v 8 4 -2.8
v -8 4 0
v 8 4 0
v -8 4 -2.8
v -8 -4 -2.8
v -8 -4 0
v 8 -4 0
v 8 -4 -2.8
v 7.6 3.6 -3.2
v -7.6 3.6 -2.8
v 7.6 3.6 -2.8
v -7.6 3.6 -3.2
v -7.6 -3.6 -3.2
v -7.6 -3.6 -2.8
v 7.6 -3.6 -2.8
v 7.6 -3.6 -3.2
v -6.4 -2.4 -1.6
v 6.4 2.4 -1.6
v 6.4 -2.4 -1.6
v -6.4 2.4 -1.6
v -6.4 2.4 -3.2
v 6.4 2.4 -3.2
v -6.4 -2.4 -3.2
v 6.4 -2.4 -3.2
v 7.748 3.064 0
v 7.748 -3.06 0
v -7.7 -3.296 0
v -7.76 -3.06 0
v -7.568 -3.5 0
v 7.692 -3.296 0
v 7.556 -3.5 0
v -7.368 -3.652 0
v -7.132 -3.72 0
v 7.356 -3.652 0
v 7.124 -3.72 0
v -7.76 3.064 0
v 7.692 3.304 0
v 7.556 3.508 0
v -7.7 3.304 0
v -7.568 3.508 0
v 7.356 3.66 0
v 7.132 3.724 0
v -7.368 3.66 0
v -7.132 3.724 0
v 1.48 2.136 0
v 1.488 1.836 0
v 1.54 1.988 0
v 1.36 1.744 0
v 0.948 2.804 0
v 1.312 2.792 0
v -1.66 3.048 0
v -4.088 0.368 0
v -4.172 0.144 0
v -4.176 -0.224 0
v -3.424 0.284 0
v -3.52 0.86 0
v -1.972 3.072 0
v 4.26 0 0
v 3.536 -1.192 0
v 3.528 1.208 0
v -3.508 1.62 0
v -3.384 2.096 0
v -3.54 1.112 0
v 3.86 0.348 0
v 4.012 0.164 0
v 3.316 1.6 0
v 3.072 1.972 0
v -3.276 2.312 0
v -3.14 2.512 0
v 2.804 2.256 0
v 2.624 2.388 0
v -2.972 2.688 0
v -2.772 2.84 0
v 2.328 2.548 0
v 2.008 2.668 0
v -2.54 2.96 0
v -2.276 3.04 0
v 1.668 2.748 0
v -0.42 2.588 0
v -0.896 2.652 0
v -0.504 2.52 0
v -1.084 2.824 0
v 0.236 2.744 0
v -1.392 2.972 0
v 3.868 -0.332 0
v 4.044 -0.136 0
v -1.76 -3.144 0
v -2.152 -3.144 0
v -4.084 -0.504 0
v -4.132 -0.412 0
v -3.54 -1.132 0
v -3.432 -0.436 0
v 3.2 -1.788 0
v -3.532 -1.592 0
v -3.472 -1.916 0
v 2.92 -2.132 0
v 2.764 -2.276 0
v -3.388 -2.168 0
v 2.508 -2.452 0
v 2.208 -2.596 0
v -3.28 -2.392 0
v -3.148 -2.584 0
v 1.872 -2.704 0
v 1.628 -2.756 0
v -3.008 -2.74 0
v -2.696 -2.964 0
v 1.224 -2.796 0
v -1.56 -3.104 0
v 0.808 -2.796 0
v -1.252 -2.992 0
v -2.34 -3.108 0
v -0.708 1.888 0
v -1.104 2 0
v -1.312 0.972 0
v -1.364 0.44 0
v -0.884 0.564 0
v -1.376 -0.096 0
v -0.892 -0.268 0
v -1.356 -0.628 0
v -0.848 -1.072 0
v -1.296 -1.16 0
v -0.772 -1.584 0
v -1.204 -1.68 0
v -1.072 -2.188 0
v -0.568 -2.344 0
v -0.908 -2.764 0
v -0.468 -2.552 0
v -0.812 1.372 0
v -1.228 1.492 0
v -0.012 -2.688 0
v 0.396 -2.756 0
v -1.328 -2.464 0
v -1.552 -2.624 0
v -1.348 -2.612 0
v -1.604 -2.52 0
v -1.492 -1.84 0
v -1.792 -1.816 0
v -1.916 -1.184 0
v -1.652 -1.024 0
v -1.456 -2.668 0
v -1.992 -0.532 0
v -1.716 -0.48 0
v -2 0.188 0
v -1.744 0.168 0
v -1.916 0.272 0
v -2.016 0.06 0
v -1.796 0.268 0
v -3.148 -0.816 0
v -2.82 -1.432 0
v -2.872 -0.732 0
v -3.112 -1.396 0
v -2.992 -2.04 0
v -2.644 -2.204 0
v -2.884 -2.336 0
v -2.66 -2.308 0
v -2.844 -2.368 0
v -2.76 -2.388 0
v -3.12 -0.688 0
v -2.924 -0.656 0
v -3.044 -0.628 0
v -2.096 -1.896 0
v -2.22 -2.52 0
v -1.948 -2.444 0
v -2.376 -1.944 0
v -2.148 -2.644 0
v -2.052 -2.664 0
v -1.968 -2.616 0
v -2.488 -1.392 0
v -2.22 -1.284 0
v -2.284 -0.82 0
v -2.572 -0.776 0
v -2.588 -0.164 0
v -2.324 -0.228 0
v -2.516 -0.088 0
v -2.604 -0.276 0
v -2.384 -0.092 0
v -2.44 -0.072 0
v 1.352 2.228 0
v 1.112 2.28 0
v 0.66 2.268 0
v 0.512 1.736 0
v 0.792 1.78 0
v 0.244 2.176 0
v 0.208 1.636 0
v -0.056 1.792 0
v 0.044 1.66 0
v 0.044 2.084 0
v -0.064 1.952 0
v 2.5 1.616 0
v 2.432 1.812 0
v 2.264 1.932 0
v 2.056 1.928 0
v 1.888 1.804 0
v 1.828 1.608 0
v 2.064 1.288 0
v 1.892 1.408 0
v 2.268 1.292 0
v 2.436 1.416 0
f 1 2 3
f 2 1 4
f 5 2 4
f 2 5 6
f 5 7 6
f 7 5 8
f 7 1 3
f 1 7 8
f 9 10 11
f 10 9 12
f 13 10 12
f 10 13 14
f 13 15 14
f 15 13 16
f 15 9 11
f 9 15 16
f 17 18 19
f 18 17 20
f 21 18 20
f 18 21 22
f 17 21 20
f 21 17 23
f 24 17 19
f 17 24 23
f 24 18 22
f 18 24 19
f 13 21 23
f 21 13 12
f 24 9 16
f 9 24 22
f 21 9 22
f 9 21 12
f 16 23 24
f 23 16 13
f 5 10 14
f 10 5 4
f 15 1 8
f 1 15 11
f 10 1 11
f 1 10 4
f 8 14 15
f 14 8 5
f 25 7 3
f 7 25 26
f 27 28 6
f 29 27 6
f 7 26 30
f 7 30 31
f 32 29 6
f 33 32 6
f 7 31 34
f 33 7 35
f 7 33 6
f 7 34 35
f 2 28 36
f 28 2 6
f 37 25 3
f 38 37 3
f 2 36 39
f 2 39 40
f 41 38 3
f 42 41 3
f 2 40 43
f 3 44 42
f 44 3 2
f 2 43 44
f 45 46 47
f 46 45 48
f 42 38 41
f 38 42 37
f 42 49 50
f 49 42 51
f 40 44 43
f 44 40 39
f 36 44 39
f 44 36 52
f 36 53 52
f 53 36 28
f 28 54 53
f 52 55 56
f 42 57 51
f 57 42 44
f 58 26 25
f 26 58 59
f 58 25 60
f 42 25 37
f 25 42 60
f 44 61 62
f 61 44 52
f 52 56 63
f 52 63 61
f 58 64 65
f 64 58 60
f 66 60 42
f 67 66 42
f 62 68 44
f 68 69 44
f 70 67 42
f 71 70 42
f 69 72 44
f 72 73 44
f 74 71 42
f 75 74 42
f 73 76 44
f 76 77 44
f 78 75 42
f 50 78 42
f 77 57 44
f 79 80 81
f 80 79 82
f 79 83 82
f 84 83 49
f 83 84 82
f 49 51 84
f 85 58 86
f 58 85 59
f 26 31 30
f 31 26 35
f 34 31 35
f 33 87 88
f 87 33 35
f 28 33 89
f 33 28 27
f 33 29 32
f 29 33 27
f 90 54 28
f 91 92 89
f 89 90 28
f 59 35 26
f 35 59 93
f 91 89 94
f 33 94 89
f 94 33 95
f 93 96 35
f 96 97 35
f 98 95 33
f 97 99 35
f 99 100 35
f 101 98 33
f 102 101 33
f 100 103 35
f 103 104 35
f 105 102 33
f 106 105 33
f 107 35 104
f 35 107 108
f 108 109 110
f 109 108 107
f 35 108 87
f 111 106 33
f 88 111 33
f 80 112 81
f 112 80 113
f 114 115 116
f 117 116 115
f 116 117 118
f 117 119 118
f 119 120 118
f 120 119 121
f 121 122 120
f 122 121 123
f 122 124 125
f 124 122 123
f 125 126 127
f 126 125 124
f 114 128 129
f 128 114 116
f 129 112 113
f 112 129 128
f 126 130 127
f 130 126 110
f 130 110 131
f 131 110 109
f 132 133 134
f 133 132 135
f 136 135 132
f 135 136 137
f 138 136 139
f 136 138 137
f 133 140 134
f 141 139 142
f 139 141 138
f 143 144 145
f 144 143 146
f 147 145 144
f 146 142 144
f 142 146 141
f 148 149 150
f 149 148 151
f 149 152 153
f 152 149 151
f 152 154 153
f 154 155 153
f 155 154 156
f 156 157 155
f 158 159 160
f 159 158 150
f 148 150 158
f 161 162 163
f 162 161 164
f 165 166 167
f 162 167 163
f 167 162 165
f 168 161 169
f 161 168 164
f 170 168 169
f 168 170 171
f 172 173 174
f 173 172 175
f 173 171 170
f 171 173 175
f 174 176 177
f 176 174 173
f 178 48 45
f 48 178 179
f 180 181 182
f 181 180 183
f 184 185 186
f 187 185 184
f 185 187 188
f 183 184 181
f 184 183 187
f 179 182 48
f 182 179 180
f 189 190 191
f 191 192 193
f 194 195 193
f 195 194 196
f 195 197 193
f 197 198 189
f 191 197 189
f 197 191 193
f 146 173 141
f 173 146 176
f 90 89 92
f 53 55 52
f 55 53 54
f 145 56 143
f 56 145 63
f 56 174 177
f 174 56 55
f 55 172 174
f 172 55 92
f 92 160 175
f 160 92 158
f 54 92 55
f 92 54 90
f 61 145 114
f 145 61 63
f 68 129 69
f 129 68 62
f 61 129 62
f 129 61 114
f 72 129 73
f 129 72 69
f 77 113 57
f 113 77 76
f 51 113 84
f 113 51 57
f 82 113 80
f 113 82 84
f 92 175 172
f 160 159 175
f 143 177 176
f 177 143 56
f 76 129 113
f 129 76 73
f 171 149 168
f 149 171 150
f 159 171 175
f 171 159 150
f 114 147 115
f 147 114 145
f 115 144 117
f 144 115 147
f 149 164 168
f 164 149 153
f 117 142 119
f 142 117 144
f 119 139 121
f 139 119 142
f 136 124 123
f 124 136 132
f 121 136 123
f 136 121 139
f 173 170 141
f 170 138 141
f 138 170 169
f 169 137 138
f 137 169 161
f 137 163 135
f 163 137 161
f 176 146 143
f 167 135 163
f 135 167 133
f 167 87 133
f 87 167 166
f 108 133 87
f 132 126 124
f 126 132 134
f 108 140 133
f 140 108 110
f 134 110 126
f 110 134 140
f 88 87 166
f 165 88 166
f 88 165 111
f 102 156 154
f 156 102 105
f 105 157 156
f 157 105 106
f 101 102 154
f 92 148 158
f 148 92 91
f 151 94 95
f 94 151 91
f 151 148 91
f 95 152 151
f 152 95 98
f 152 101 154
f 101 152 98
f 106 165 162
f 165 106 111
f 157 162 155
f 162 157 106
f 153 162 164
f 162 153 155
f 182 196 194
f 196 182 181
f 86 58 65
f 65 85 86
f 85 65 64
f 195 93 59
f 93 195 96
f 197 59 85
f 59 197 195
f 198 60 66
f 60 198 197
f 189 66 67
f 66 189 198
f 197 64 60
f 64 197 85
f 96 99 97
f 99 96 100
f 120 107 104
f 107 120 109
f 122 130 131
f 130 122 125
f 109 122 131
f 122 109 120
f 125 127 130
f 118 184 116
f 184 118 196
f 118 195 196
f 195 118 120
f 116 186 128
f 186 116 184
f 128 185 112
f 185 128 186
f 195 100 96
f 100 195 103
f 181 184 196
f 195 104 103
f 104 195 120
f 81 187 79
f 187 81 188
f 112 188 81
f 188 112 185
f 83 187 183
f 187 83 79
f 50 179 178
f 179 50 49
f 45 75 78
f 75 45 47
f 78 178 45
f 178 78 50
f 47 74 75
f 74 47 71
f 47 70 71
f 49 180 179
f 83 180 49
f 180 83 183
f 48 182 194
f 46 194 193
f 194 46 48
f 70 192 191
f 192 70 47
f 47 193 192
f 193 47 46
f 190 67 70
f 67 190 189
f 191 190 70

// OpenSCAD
// file: ../p/box5.scad
use <../lib.scad>
function ldraw_lib__box5() = [
// 0 Box with 5 Faces and All Edges
// 0 Name: box5.dat
// 0 Author: James Jessiman
// 0 !LDRAW_ORG Primitive UPDATE 2012-01
// 0 !LICENSE Licensed under CC BY 4.0 : see CAreadme.txt
// 
// 0 BFC CERTIFY CCW
  [0,"BFC","CERTIFY"],
  [0,"BFC","CCW"],
// 
// 0 !HISTORY 2002-04-03 [sbliss] Modified for BFC compliance
// 0 !HISTORY 2002-04-25 [PTadmin] Official Update 2002-02
// 0 !HISTORY 2007-06-24 [PTadmin] Header formatted for Contributor Agreement
// 0 !HISTORY 2008-07-01 [PTadmin] Official Update 2008-01
// 0 !HISTORY 2012-02-16 [Philo] Changed to CCW
// 0 !HISTORY 2012-03-30 [PTadmin] Official Update 2012-01
// 
// 
// 2 24 1 1 1 -1 1 1
  [2,24,1,1,1,-1,1,1],
// 2 24 -1 1 1 -1 1 -1
  [2,24,-1,1,1,-1,1,-1],
// 2 24 -1 1 -1 1 1 -1
  [2,24,-1,1,-1,1,1,-1],
// 2 24 1 1 -1 1 1 1
  [2,24,1,1,-1,1,1,1],
// 2 24 1 0 1 -1 0 1
  [2,24,1,0,1,-1,0,1],
// 2 24 -1 0 1 -1 0 -1
  [2,24,-1,0,1,-1,0,-1],
// 2 24 -1 0 -1 1 0 -1
  [2,24,-1,0,-1,1,0,-1],
// 2 24 1 0 -1 1 0 1
  [2,24,1,0,-1,1,0,1],
// 2 24 1 0 1 1 1 1
  [2,24,1,0,1,1,1,1],
// 2 24 -1 0 1 -1 1 1
  [2,24,-1,0,1,-1,1,1],
// 2 24 1 0 -1 1 1 -1
  [2,24,1,0,-1,1,1,-1],
// 2 24 -1 0 -1 -1 1 -1
  [2,24,-1,0,-1,-1,1,-1],
// 4 16 -1 1 1 1 1 1 1 1 -1 -1 1 -1
  [4,16,-1,1,1,1,1,1,1,1,-1,-1,1,-1],
// 4 16 -1 1 1 -1 0 1 1 0 1 1 1 1
  [4,16,-1,1,1,-1,0,1,1,0,1,1,1,1],
// 4 16 -1 1 -1 -1 0 -1 -1 0 1 -1 1 1
  [4,16,-1,1,-1,-1,0,-1,-1,0,1,-1,1,1],
// 4 16 1 1 -1 1 0 -1 -1 0 -1 -1 1 -1
  [4,16,1,1,-1,1,0,-1,-1,0,-1,-1,1,-1],
// 4 16 1 1 1 1 0 1 1 0 -1 1 1 -1
  [4,16,1,1,1,1,0,1,1,0,-1,1,1,-1],
];
module ldraw_lib__box5(step=0, col=false, unit=2/5, alt=false, line=0.2, solid=!$preview)
    makepoly(ldraw_lib__box5(), step=step, col=col, unit=unit, alt=alt, line=line, solid=solid);
ldraw_lib__box5(line=0.2);
// file: ../p/box4.scad
use <../lib.scad>
function ldraw_lib__box4() = [
// 0 Box with 4 Faces (2 Parallel Pairs) and All Edges
// 0 Name: box4.dat
// 0 Author: James Jessiman
// 0 !LDRAW_ORG Primitive UPDATE 2012-01
// 0 !LICENSE Licensed under CC BY 4.0 : see CAreadme.txt
// 
// 0 BFC CERTIFY CCW
  [0,"BFC","CERTIFY"],
  [0,"BFC","CCW"],
// 
// 0 !HISTORY 2002-04-03 [sbliss] Modified for BFC compliance
// 0 !HISTORY 2002-04-25 [PTadmin] Official Update 2002-02
// 0 !HISTORY 2007-06-24 [PTadmin] Header formatted for Contributor Agreement
// 0 !HISTORY 2008-07-01 [PTadmin] Official Update 2008-01
// 0 !HISTORY 2012-02-16 [Philo] Changed to CCW
// 0 !HISTORY 2012-03-30 [PTadmin] Official Update 2012-01
// 
// 
// 2 24 1 1 1 -1 1 1
  [2,24,1,1,1,-1,1,1],
// 2 24 -1 1 1 -1 1 -1
  [2,24,-1,1,1,-1,1,-1],
// 2 24 -1 1 -1 1 1 -1
  [2,24,-1,1,-1,1,1,-1],
// 2 24 1 1 -1 1 1 1
  [2,24,1,1,-1,1,1,1],
// 2 24 1 0 1 -1 0 1
  [2,24,1,0,1,-1,0,1],
// 2 24 -1 0 1 -1 0 -1
  [2,24,-1,0,1,-1,0,-1],
// 2 24 -1 0 -1 1 0 -1
  [2,24,-1,0,-1,1,0,-1],
// 2 24 1 0 -1 1 0 1
  [2,24,1,0,-1,1,0,1],
// 2 24 1 0 1 1 1 1
  [2,24,1,0,1,1,1,1],
// 2 24 -1 0 1 -1 1 1
  [2,24,-1,0,1,-1,1,1],
// 2 24 1 0 -1 1 1 -1
  [2,24,1,0,-1,1,1,-1],
// 2 24 -1 0 -1 -1 1 -1
  [2,24,-1,0,-1,-1,1,-1],
// 4 16 -1 1 1 -1 0 1 1 0 1 1 1 1
  [4,16,-1,1,1,-1,0,1,1,0,1,1,1,1],
// 4 16 -1 1 -1 -1 0 -1 -1 0 1 -1 1 1
  [4,16,-1,1,-1,-1,0,-1,-1,0,1,-1,1,1],
// 4 16 1 1 -1 1 0 -1 -1 0 -1 -1 1 -1
  [4,16,1,1,-1,1,0,-1,-1,0,-1,-1,1,-1],
// 4 16 1 1 1 1 0 1 1 0 -1 1 1 -1
  [4,16,1,1,1,1,0,1,1,0,-1,1,1,-1],
];
module ldraw_lib__box4(step=0, col=false, unit=2/5, alt=false, line=0.2, solid=!$preview)
    makepoly(ldraw_lib__box4(), step=step, col=col, unit=unit, alt=alt, line=line, solid=solid);
ldraw_lib__box4(line=0.2);
// file: s/3069bs01.scad
use <../../lib.scad>
use <../../p/box4.scad>
use <../../p/box5.scad>
function ldraw_lib__s__3069bs01() = [
// 0 ~Tile  1 x  2 with Groove without Top Face
// 0 Name: s\3069bs01.dat
// 0 Author: Santeri Piippo [arezey]
// 0 !LDRAW_ORG Subpart UPDATE 2010-02
// 0 !LICENSE Licensed under CC BY 4.0 : see CAreadme.txt
// 
// 0 BFC CERTIFY CCW
  [0,"BFC","CERTIFY"],
  [0,"BFC","CCW"],
// 
// 0 !HISTORY 2010-07-05 [PTadmin] Official Update 2010-02
// 
// 
// 1 16 0 0 0 20 0 0 0 7 0 0 0 10 box4.dat
  [1,16,0,0,0,20,0,0,0,7,0,0,0,10, ldraw_lib__box4()],
// 1 16 0 7 0 19 0 0 0 1 0 0 0 9 box4.dat
  [1,16,0,7,0,19,0,0,0,1,0,0,0,9, ldraw_lib__box4()],
// 0 BFC INVERTNEXT
  [0,"BFC","INVERTNEXT"],
// 1 16 0 8 0 16 0 0 0 -4 0 0 0 6 box5.dat
  [1,16,0,8,0,16,0,0,0,-4,0,0,0,6, ldraw_lib__box5()],
// 4 16 -19 8 9 -16 8 6 -16 8 -6 -19 8 -9
  [4,16,-19,8,9,-16,8,6,-16,8,-6,-19,8,-9],
// 4 16 19 8 -9 16 8 -6 16 8 6 19 8 9
  [4,16,19,8,-9,16,8,-6,16,8,6,19,8,9],
// 4 16 19 8 9 16 8 6 -16 8 6 -19 8 9
  [4,16,19,8,9,16,8,6,-16,8,6,-19,8,9],
// 4 16 -19 8 -9 -16 8 -6 16 8 -6 19 8 -9
  [4,16,-19,8,-9,-16,8,-6,16,8,-6,19,8,-9],
// 4 16 -20 7 10 -19 7 9 -19 7 -9 -20 7 -10
  [4,16,-20,7,10,-19,7,9,-19,7,-9,-20,7,-10],
// 4 16 20 7 -10 19 7 -9 19 7 9 20 7 10
  [4,16,20,7,-10,19,7,-9,19,7,9,20,7,10],
// 4 16 20 7 10 19 7 9 -19 7 9 -20 7 10
  [4,16,20,7,10,19,7,9,-19,7,9,-20,7,10],
// 4 16 -20 7 -10 -19 7 -9 19 7 -9 20 7 -10
  [4,16,-20,7,-10,-19,7,-9,19,7,-9,20,7,-10],
// 0 //
];
module ldraw_lib__s__3069bs01(step=0, col=false, unit=2/5, alt=false, line=0.2, solid=!$preview)
    makepoly(ldraw_lib__s__3069bs01(), step=step, col=col, unit=unit, alt=alt, line=line, solid=solid);
ldraw_lib__s__3069bs01(line=0.2);
// main file
use <../lib.scad>
use <s/3069bs01.scad>
function ldraw_lib__3069bp0v() = [
// 0 Tile  1 x  2 with Dark Brown and Bright Light Yellow Acorn on Medium Nougat Background Pattern
// 0 Name: 3069bp0v.dat
// 0 Author: Philippe Hurbain [Philo]
// 0 !LDRAW_ORG Part UPDATE 2024-07
// 0 !LICENSE Licensed under CC BY 4.0 : see CAreadme.txt
// 
// 0 BFC CERTIFY CCW
  [0,"BFC","CERTIFY"],
  [0,"BFC","CCW"],
// 
// 0 !KEYWORDS Animal Crossing, Bricklink 3069pb1220, DIY Recipe, Set 77048
// 0 !KEYWORDS Set 77049, set 77050
// 
// 0 !HISTORY 2024-08-26 [OrionP] Official Update 2024-07
// 
// 1 16 0 0 0 1 0 0 0 1 0 0 0 1 s\3069bs01.dat
  [1,16,0,0,0,1,0,0,0,1,0,0,0,1, ldraw_lib__s__3069bs01()],
// 4 16 20 0 -10 20 0 10 19.37 0 7.66 19.37 0 -7.65
  [4,16,20,0,-10,20,0,10,19.37,0,7.66,19.37,0,-7.65],
// 3 16 -19.25 0 -8.24 -19.4 0 -7.65 -20 0 -10
  [3,16,-19.25,0,-8.24,-19.4,0,-7.65,-20,0,-10],
// 3 16 -18.92 0 -8.75 -19.25 0 -8.24 -20 0 -10
  [3,16,-18.92,0,-8.75,-19.25,0,-8.24,-20,0,-10],
// 3 16 20 0 -10 19.37 0 -7.65 19.23 0 -8.24
  [3,16,20,0,-10,19.37,0,-7.65,19.23,0,-8.24],
// 3 16 20 0 -10 19.23 0 -8.24 18.89 0 -8.75
  [3,16,20,0,-10,19.23,0,-8.24,18.89,0,-8.75],
// 3 16 -18.42 0 -9.13 -18.92 0 -8.75 -20 0 -10
  [3,16,-18.42,0,-9.13,-18.92,0,-8.75,-20,0,-10],
// 3 16 -17.83 0 -9.3 -18.42 0 -9.13 -20 0 -10
  [3,16,-17.83,0,-9.3,-18.42,0,-9.13,-20,0,-10],
// 3 16 20 0 -10 18.89 0 -8.75 18.39 0 -9.13
  [3,16,20,0,-10,18.89,0,-8.75,18.39,0,-9.13],
// 4 16 20 0 -10 17.81 0 -9.3 -17.83 0 -9.3 -20 0 -10
  [4,16,20,0,-10,17.81,0,-9.3,-17.83,0,-9.3,-20,0,-10],
// 3 16 20 0 -10 18.39 0 -9.13 17.81 0 -9.3
  [3,16,20,0,-10,18.39,0,-9.13,17.81,0,-9.3],
// 4 16 -20 0 -10 -19.4 0 -7.65 -19.4 0 7.66 -20 0 10
  [4,16,-20,0,-10,-19.4,0,-7.65,-19.4,0,7.66,-20,0,10],
// 3 16 19.23 0 8.26 19.37 0 7.66 20 0 10
  [3,16,19.23,0,8.26,19.37,0,7.66,20,0,10],
// 3 16 18.89 0 8.77 19.23 0 8.26 20 0 10
  [3,16,18.89,0,8.77,19.23,0,8.26,20,0,10],
// 3 16 -20 0 10 -19.4 0 7.66 -19.25 0 8.26
  [3,16,-20,0,10,-19.4,0,7.66,-19.25,0,8.26],
// 3 16 -20 0 10 -19.25 0 8.26 -18.92 0 8.77
  [3,16,-20,0,10,-19.25,0,8.26,-18.92,0,8.77],
// 3 16 18.39 0 9.15 18.89 0 8.77 20 0 10
  [3,16,18.39,0,9.15,18.89,0,8.77,20,0,10],
// 3 16 17.83 0 9.31 18.39 0 9.15 20 0 10
  [3,16,17.83,0,9.31,18.39,0,9.15,20,0,10],
// 3 16 -20 0 10 -18.92 0 8.77 -18.42 0 9.15
  [3,16,-20,0,10,-18.92,0,8.77,-18.42,0,9.15],
// 4 16 -20 0 10 -17.83 0 9.31 17.83 0 9.31 20 0 10
  [4,16,-20,0,10,-17.83,0,9.31,17.83,0,9.31,20,0,10],
// 3 16 -20 0 10 -18.42 0 9.15 -17.83 0 9.31
  [3,16,-20,0,10,-18.42,0,9.15,-17.83,0,9.31],
// 4 84 3.85 0 4.97 3.7 0 5.34 3.4 0 4.36 3.72 0 4.59
  [4,84,3.85,0,4.97,3.7,0,5.34,3.4,0,4.36,3.72,0,4.59],
// 4 84 18.39 0 9.15 17.83 0 9.31 19.23 0 8.26 18.89 0 8.77
  [4,84,18.39,0,9.15,17.83,0,9.31,19.23,0,8.26,18.89,0,8.77],
// 4 84 3.28 0 6.98 17.83 0 9.31 -4.15 0 7.62 2.37 0 7.01
  [4,84,3.28,0,6.98,17.83,0,9.31,-4.15,0,7.62,2.37,0,7.01],
// 4 84 -18.42 0 9.15 -18.92 0 8.77 -19.25 0 8.26 -17.83 0 9.31
  [4,84,-18.42,0,9.15,-18.92,0,8.77,-19.25,0,8.26,-17.83,0,9.31],
// 4 84 -10.22 0 .92 -17.83 0 9.31 -19.25 0 8.26 -19.4 0 7.66
  [4,84,-10.22,0,.92,-17.83,0,9.31,-19.25,0,8.26,-19.4,0,7.66],
// 4 84 -19.4 0 -7.65 -10.43 0 .36 -10.22 0 .92 -19.4 0 7.66
  [4,84,-19.4,0,-7.65,-10.43,0,.36,-10.22,0,.92,-19.4,0,7.66],
// 3 84 -19.4 0 -7.65 -10.44 0 -.56 -10.43 0 .36
  [3,84,-19.4,0,-7.65,-10.44,0,-.56,-10.43,0,.36],
// 3 84 -10.22 0 .92 -8.56 0 .71 -8.8 0 2.15
  [3,84,-10.22,0,.92,-8.56,0,.71,-8.8,0,2.15],
// 4 84 -17.83 0 9.31 -4.93 0 7.68 -4.15 0 7.62 17.83 0 9.31
  [4,84,-17.83,0,9.31,-4.93,0,7.68,-4.15,0,7.62,17.83,0,9.31],
// 4 84 8.84 0 -2.98 19.37 0 -7.65 19.37 0 7.66 10.65 0 0
  [4,84,8.84,0,-2.98,19.37,0,-7.65,19.37,0,7.66,10.65,0,0],
// 3 84 10.65 0 0 19.37 0 7.66 8.82 0 3.02
  [3,84,10.65,0,0,19.37,0,7.66,8.82,0,3.02],
// 4 84 19.23 0 8.26 17.83 0 9.31 8.82 0 3.02 19.37 0 7.66
  [4,84,19.23,0,8.26,17.83,0,9.31,8.82,0,3.02,19.37,0,7.66],
// 4 84 -8.46 0 5.24 -17.83 0 9.31 -10.22 0 .92 -8.77 0 4.05
  [4,84,-8.46,0,5.24,-17.83,0,9.31,-10.22,0,.92,-8.77,0,4.05],
// 3 84 -10.22 0 .92 -8.8 0 2.15 -8.85 0 2.78
  [3,84,-10.22,0,.92,-8.8,0,2.15,-8.85,0,2.78],
// 3 84 -10.22 0 .92 -8.85 0 2.78 -8.77 0 4.05
  [3,84,-10.22,0,.92,-8.85,0,2.78,-8.77,0,4.05],
// 4 84 10.03 0 .41 10.65 0 0 8.82 0 3.02 9.65 0 .87
  [4,84,10.03,0,.41,10.65,0,0,8.82,0,3.02,9.65,0,.87],
// 3 84 8.29 0 4 8.82 0 3.02 17.83 0 9.31
  [3,84,8.29,0,4,8.82,0,3.02,17.83,0,9.31],
// 3 84 7.68 0 4.93 8.29 0 4 17.83 0 9.31
  [3,84,7.68,0,4.93,8.29,0,4,17.83,0,9.31],
// 3 84 -8.46 0 5.24 -8.19 0 5.78 -17.83 0 9.31
  [3,84,-8.46,0,5.24,-8.19,0,5.78,-17.83,0,9.31],
// 3 84 -8.19 0 5.78 -7.85 0 6.28 -17.83 0 9.31
  [3,84,-8.19,0,5.78,-7.85,0,6.28,-17.83,0,9.31],
// 3 84 7.01 0 5.64 7.68 0 4.93 17.83 0 9.31
  [3,84,7.01,0,5.64,7.68,0,4.93,17.83,0,9.31],
// 3 84 6.56 0 5.97 7.01 0 5.64 17.83 0 9.31
  [3,84,6.56,0,5.97,7.01,0,5.64,17.83,0,9.31],
// 3 84 -7.85 0 6.28 -7.43 0 6.72 -17.83 0 9.31
  [3,84,-7.85,0,6.28,-7.43,0,6.72,-17.83,0,9.31],
// 3 84 -7.43 0 6.72 -6.93 0 7.1 -17.83 0 9.31
  [3,84,-7.43,0,6.72,-6.93,0,7.1,-17.83,0,9.31],
// 3 84 5.82 0 6.37 6.56 0 5.97 17.83 0 9.31
  [3,84,5.82,0,6.37,6.56,0,5.97,17.83,0,9.31],
// 3 84 5.02 0 6.67 5.82 0 6.37 17.83 0 9.31
  [3,84,5.02,0,6.67,5.82,0,6.37,17.83,0,9.31],
// 3 84 -6.93 0 7.1 -6.35 0 7.4 -17.83 0 9.31
  [3,84,-6.93,0,7.1,-6.35,0,7.4,-17.83,0,9.31],
// 3 84 -6.35 0 7.4 -5.69 0 7.6 -17.83 0 9.31
  [3,84,-6.35,0,7.4,-5.69,0,7.6,-17.83,0,9.31],
// 3 84 4.17 0 6.87 5.02 0 6.67 17.83 0 9.31
  [3,84,4.17,0,6.87,5.02,0,6.67,17.83,0,9.31],
// 3 84 3.28 0 6.98 4.17 0 6.87 17.83 0 9.31
  [3,84,3.28,0,6.98,4.17,0,6.87,17.83,0,9.31],
// 3 84 -5.69 0 7.6 -4.93 0 7.68 -17.83 0 9.31
  [3,84,-5.69,0,7.6,-4.93,0,7.68,-17.83,0,9.31],
// 4 84 -1.26 0 6.3 -1.05 0 6.47 -2.71 0 7.06 -2.24 0 6.63
  [4,84,-1.26,0,6.3,-1.05,0,6.47,-2.71,0,7.06,-2.24,0,6.63],
// 3 84 -1.05 0 6.47 .59 0 6.86 -2.71 0 7.06
  [3,84,-1.05,0,6.47,.59,0,6.86,-2.71,0,7.06],
// 4 84 -2.71 0 7.06 .59 0 6.86 2.37 0 7.01 -3.48 0 7.43
  [4,84,-2.71,0,7.06,.59,0,6.86,2.37,0,7.01,-3.48,0,7.43],
// 3 84 2.37 0 7.01 -4.15 0 7.62 -3.48 0 7.43
  [3,84,2.37,0,7.01,-4.15,0,7.62,-3.48,0,7.43],
// 4 84 8.84 0 -2.98 10.65 0 0 10.11 0 -.34 9.67 0 -.83
  [4,84,8.84,0,-2.98,10.65,0,0,10.11,0,-.34,9.67,0,-.83],
// 4 84 18.89 0 -8.75 19.23 0 -8.24 19.37 0 -7.65 17.81 0 -9.3
  [4,84,18.89,0,-8.75,19.23,0,-8.24,19.37,0,-7.65,17.81,0,-9.3],
// 3 84 18.39 0 -9.13 18.89 0 -8.75 17.81 0 -9.3
  [3,84,18.39,0,-9.13,18.89,0,-8.75,17.81,0,-9.3],
// 4 84 -5.38 0 -7.86 -17.83 0 -9.3 17.81 0 -9.3 -4.4 0 -7.86
  [4,84,-5.38,0,-7.86,-17.83,0,-9.3,17.81,0,-9.3,-4.4,0,-7.86],
// 4 84 -10.21 0 -1.26 -19.4 0 -7.65 -19.25 0 -8.24 -17.83 0 -9.3
  [4,84,-10.21,0,-1.26,-19.4,0,-7.65,-19.25,0,-8.24,-17.83,0,-9.3],
// 4 84 -18.42 0 -9.13 -17.83 0 -9.3 -19.25 0 -8.24 -18.92 0 -8.75
  [4,84,-18.42,0,-9.13,-17.83,0,-9.3,-19.25,0,-8.24,-18.92,0,-8.75],
// 3 84 -10.33 0 -1.03 -10.44 0 -.56 -19.4 0 -7.65
  [3,84,-10.33,0,-1.03,-10.44,0,-.56,-19.4,0,-7.65],
// 3 84 -8.85 0 -2.83 -8.58 0 -1.09 -10.21 0 -1.26
  [3,84,-8.85,0,-2.83,-8.58,0,-1.09,-10.21,0,-1.26],
// 3 84 -10.21 0 -1.26 -10.33 0 -1.03 -19.4 0 -7.65
  [3,84,-10.21,0,-1.26,-10.33,0,-1.03,-19.4,0,-7.65],
// 4 84 8 0 -4.47 17.81 0 -9.3 19.37 0 -7.65 8.84 0 -2.98
  [4,84,8,0,-4.47,17.81,0,-9.3,19.37,0,-7.65,8.84,0,-2.98],
// 3 84 -8.85 0 -2.83 -10.21 0 -1.26 -8.83 0 -3.98
  [3,84,-8.85,0,-2.83,-10.21,0,-1.26,-8.83,0,-3.98],
// 4 84 -8.68 0 -4.79 -8.83 0 -3.98 -10.21 0 -1.26 -17.83 0 -9.3
  [4,84,-8.68,0,-4.79,-8.83,0,-3.98,-10.21,0,-1.26,-17.83,0,-9.3],
// 3 84 8 0 -4.47 7.3 0 -5.33 17.81 0 -9.3
  [3,84,8,0,-4.47,7.3,0,-5.33,17.81,0,-9.3],
// 3 84 7.3 0 -5.33 6.91 0 -5.69 17.81 0 -9.3
  [3,84,7.3,0,-5.33,6.91,0,-5.69,17.81,0,-9.3],
// 3 84 -8.47 0 -5.42 -8.68 0 -4.79 -17.83 0 -9.3
  [3,84,-8.47,0,-5.42,-8.68,0,-4.79,-17.83,0,-9.3],
// 3 84 6.91 0 -5.69 6.27 0 -6.13 17.81 0 -9.3
  [3,84,6.91,0,-5.69,6.27,0,-6.13,17.81,0,-9.3],
// 3 84 6.27 0 -6.13 5.52 0 -6.49 17.81 0 -9.3
  [3,84,6.27,0,-6.13,5.52,0,-6.49,17.81,0,-9.3],
// 3 84 -8.2 0 -5.98 -8.47 0 -5.42 -17.83 0 -9.3
  [3,84,-8.2,0,-5.98,-8.47,0,-5.42,-17.83,0,-9.3],
// 3 84 -7.87 0 -6.46 -8.2 0 -5.98 -17.83 0 -9.3
  [3,84,-7.87,0,-6.46,-8.2,0,-5.98,-17.83,0,-9.3],
// 3 84 5.52 0 -6.49 4.68 0 -6.76 17.81 0 -9.3
  [3,84,5.52,0,-6.49,4.68,0,-6.76,17.81,0,-9.3],
// 3 84 4.68 0 -6.76 4.07 0 -6.89 17.81 0 -9.3
  [3,84,4.68,0,-6.76,4.07,0,-6.89,17.81,0,-9.3],
// 3 84 -7.52 0 -6.85 -7.87 0 -6.46 -17.83 0 -9.3
  [3,84,-7.52,0,-6.85,-7.87,0,-6.46,-17.83,0,-9.3],
// 3 84 -6.74 0 -7.41 -7.52 0 -6.85 -17.83 0 -9.3
  [3,84,-6.74,0,-7.41,-7.52,0,-6.85,-17.83,0,-9.3],
// 4 84 -3.9 0 -7.76 17.81 0 -9.3 4.07 0 -6.89 3.06 0 -6.99
  [4,84,-3.9,0,-7.76,17.81,0,-9.3,4.07,0,-6.89,3.06,0,-6.99],
// 4 84 -3.13 0 -7.48 -3.9 0 -7.76 3.06 0 -6.99 2.02 0 -6.99
  [4,84,-3.13,0,-7.48,-3.9,0,-7.76,3.06,0,-6.99,2.02,0,-6.99],
// 3 84 17.81 0 -9.3 -3.9 0 -7.76 -4.4 0 -7.86
  [3,84,17.81,0,-9.3,-3.9,0,-7.76,-4.4,0,-7.86],
// 3 84 -5.85 0 -7.77 -6.74 0 -7.41 -17.83 0 -9.3
  [3,84,-5.85,0,-7.77,-6.74,0,-7.41,-17.83,0,-9.3],
// 3 84 -5.38 0 -7.86 -5.85 0 -7.77 -17.83 0 -9.3
  [3,84,-5.38,0,-7.86,-5.85,0,-7.77,-17.83,0,-9.3],
// 4 84 -1.26 0 6.3 -2.24 0 6.63 -2.76 0 5 -1.77 0 4.72
  [4,84,-1.26,0,6.3,-2.24,0,6.63,-2.76,0,5,-1.77,0,4.72],
// 3 84 -3.28 0 2.43 -3.41 0 1.1 -2.21 0 1.41
  [3,84,-3.28,0,2.43,-3.41,0,1.1,-2.21,0,1.41],
// 4 84 -2.23 0 -.67 -2.21 0 1.41 -3.41 0 1.1 -3.44 0 -.24
  [4,84,-2.23,0,-.67,-2.21,0,1.41,-3.41,0,1.1,-3.44,0,-.24],
// 3 84 -3.44 0 -.24 -3.39 0 -1.57 -2.23 0 -.67
  [3,84,-3.44,0,-.24,-3.39,0,-1.57,-2.23,0,-.67],
// 4 84 -2.23 0 -.67 -3.39 0 -1.57 -3.24 0 -2.9 -2.12 0 -2.68
  [4,84,-2.23,0,-.67,-3.39,0,-1.57,-3.24,0,-2.9,-2.12,0,-2.68],
// 4 84 -3.01 0 -4.2 -1.93 0 -3.96 -2.12 0 -2.68 -3.24 0 -2.9
  [4,84,-3.01,0,-4.2,-1.93,0,-3.96,-2.12,0,-2.68,-3.24,0,-2.9],
// 4 84 -1.42 0 -5.86 -1.93 0 -3.96 -3.01 0 -4.2 -2.68 0 -5.47
  [4,84,-1.42,0,-5.86,-1.93,0,-3.96,-3.01,0,-4.2,-2.68,0,-5.47],
// 4 84 -1.17 0 -6.38 -1.42 0 -5.86 -2.68 0 -5.47 -2.27 0 -6.91
  [4,84,-1.17,0,-6.38,-1.42,0,-5.86,-2.68,0,-5.47,-2.27,0,-6.91],
// 4 84 -3.07 0 3.73 -3.28 0 2.43 -2.21 0 1.41 -2.03 0 3.43
  [4,84,-3.07,0,3.73,-3.28,0,2.43,-2.21,0,1.41,-2.03,0,3.43],
// 4 84 -2.76 0 5 -3.07 0 3.73 -2.03 0 3.43 -1.77 0 4.72
  [4,84,-2.76,0,5,-3.07,0,3.73,-2.03,0,3.43,-1.77,0,4.72],
// 4 84 -3.13 0 -7.48 -.03 0 -6.72 -1.17 0 -6.38 -2.27 0 -6.91
  [4,84,-3.13,0,-7.48,-.03,0,-6.72,-1.17,0,-6.38,-2.27,0,-6.91],
// 3 84 -.03 0 -6.72 -3.13 0 -7.48 .99 0 -6.89
  [3,84,-.03,0,-6.72,-3.13,0,-7.48,.99,0,-6.89],
// 3 84 .99 0 -6.89 -3.13 0 -7.48 2.02 0 -6.99
  [3,84,.99,0,-6.89,-3.13,0,-7.48,2.02,0,-6.99],
// 4 84 -4.01 0 -6.3 -3.88 0 -6.56 -3.37 0 -6.53 -3.32 0 -6.16
  [4,84,-4.01,0,-6.3,-3.88,0,-6.56,-3.37,0,-6.53,-3.32,0,-6.16],
// 4 84 -4.48 0 -4.54 -4.01 0 -6.3 -3.32 0 -6.16 -3.73 0 -4.6
  [4,84,-4.48,0,-4.54,-4.01,0,-6.3,-3.32,0,-6.16,-3.73,0,-4.6],
// 4 84 -4.48 0 -4.54 -3.73 0 -4.6 -4.13 0 -2.56 -4.79 0 -2.96
  [4,84,-4.48,0,-4.54,-3.73,0,-4.6,-4.13,0,-2.56,-4.79,0,-2.96],
// 3 84 -3.88 0 -6.56 -3.64 0 -6.67 -3.37 0 -6.53
  [3,84,-3.88,0,-6.56,-3.64,0,-6.67,-3.37,0,-6.53],
// 4 84 -4.29 0 -1.2 -4.98 0 -1.33 -4.79 0 -2.96 -4.13 0 -2.56
  [4,84,-4.29,0,-1.2,-4.98,0,-1.33,-4.79,0,-2.96,-4.13,0,-2.56],
// 4 84 -4.79 0 .68 -5 0 .47 -5.04 0 .15 -4.36 0 .42
  [4,84,-4.79,0,.68,-5,0,.47,-5.04,0,.15,-4.36,0,.42],
// 3 84 -4.49 0 .67 -4.79 0 .68 -4.36 0 .42
  [3,84,-4.49,0,.67,-4.79,0,.68,-4.36,0,.42],
// 4 84 -4.98 0 -1.33 -4.29 0 -1.2 -4.36 0 .42 -5.04 0 .15
  [4,84,-4.98,0,-1.33,-4.29,0,-1.2,-4.36,0,.42,-5.04,0,.15],
// 4 84 -7.18 0 -1.83 -7.87 0 -2.04 -7.78 0 -3.49 -7.05 0 -3.58
  [4,84,-7.18,0,-1.83,-7.87,0,-2.04,-7.78,0,-3.49,-7.05,0,-3.58],
// 4 84 -6.61 0 -5.51 -7.05 0 -3.58 -7.78 0 -3.49 -7.48 0 -5.1
  [4,84,-6.61,0,-5.51,-7.05,0,-3.58,-7.78,0,-3.49,-7.48,0,-5.1],
// 3 84 -7.48 0 -5.1 -7.21 0 -5.84 -6.61 0 -5.51
  [3,84,-7.48,0,-5.1,-7.21,0,-5.84,-6.61,0,-5.51],
// 4 84 -7.11 0 -5.92 -6.65 0 -5.77 -6.61 0 -5.51 -7.21 0 -5.84
  [4,84,-7.11,0,-5.92,-6.65,0,-5.77,-6.61,0,-5.51,-7.21,0,-5.84],
// 3 84 -7.11 0 -5.92 -6.9 0 -5.97 -6.65 0 -5.77
  [3,84,-7.11,0,-5.92,-6.9,0,-5.97,-6.65,0,-5.77],
// 4 84 -7.61 0 -1.57 -7.8 0 -1.72 -7.18 0 -1.83 -7.31 0 -1.64
  [4,84,-7.61,0,-1.57,-7.8,0,-1.72,-7.18,0,-1.83,-7.31,0,-1.64],
// 3 84 -7.87 0 -2.04 -7.18 0 -1.83 -7.8 0 -1.72
  [3,84,-7.87,0,-2.04,-7.18,0,-1.83,-7.8,0,-1.72],
// 4 84 -4.87 0 -6.11 -5.24 0 -4.74 -5.94 0 -4.86 -5.55 0 -6.3
  [4,84,-4.87,0,-6.11,-5.24,0,-4.74,-5.94,0,-4.86,-5.55,0,-6.3],
// 3 84 -5.37 0 -6.61 -5.13 0 -6.66 -4.92 0 -6.54
  [3,84,-5.37,0,-6.61,-5.13,0,-6.66,-4.92,0,-6.54],
// 4 84 -5.37 0 -6.61 -4.92 0 -6.54 -4.87 0 -6.11 -5.55 0 -6.3
  [4,84,-5.37,0,-6.61,-4.92,0,-6.54,-4.87,0,-6.11,-5.55,0,-6.3],
// 4 84 -5.55 0 -3.21 -6.22 0 -3.48 -5.94 0 -4.86 -5.24 0 -4.74
  [4,84,-5.55,0,-3.21,-6.22,0,-3.48,-5.94,0,-4.86,-5.24,0,-4.74],
// 4 84 -5.55 0 -3.21 -5.71 0 -2.05 -6.43 0 -1.94 -6.22 0 -3.48
  [4,84,-5.55,0,-3.21,-5.71,0,-2.05,-6.43,0,-1.94,-6.22,0,-3.48],
// 4 84 -6.29 0 -.22 -6.47 0 -.41 -6.51 0 -.69 -5.81 0 -.57
  [4,84,-6.29,0,-.22,-6.47,0,-.41,-6.51,0,-.69,-5.81,0,-.57],
// 4 84 -5.71 0 -2.05 -5.81 0 -.57 -6.51 0 -.69 -6.43 0 -1.94
  [4,84,-5.71,0,-2.05,-5.81,0,-.57,-6.51,0,-.69,-6.43,0,-1.94],
// 4 84 -5.81 0 -.57 -5.96 0 -.23 -6.1 0 -.18 -6.29 0 -.22
  [4,84,-5.81,0,-.57,-5.96,0,-.23,-6.1,0,-.18,-6.29,0,-.22],
// 4 84 2.78 0 5.7 3.4 0 4.36 3.7 0 5.34 3.38 0 5.57
  [4,84,2.78,0,5.7,3.4,0,4.36,3.7,0,5.34,3.38,0,5.57],
// 4 84 .61 0 5.44 1.28 0 4.34 1.98 0 4.45 1.65 0 5.67
  [4,84,.61,0,5.44,1.28,0,4.34,1.98,0,4.45,1.65,0,5.67],
// 3 84 .52 0 4.09 -.14 0 4.48 .11 0 4.15
  [3,84,.52,0,4.09,-.14,0,4.48,.11,0,4.15],
// 4 84 -.16 0 4.88 -.14 0 4.48 .52 0 4.09 .11 0 5.21
  [4,84,-.16,0,4.88,-.14,0,4.48,.52,0,4.09,.11,0,5.21],
// 4 84 .11 0 5.21 .52 0 4.09 1.28 0 4.34 .61 0 5.44
  [4,84,.11,0,5.21,.52,0,4.09,1.28,0,4.34,.61,0,5.44],
// 4 84 1.65 0 5.67 1.98 0 4.45 3.4 0 4.36 2.78 0 5.7
  [4,84,1.65,0,5.67,1.98,0,4.45,3.4,0,4.36,2.78,0,5.7],
// 3 84 6.25 0 4.04 6.08 0 4.53 5.66 0 4.83
  [3,84,6.25,0,4.04,6.08,0,4.53,5.66,0,4.83],
// 3 84 5.66 0 4.83 5.14 0 4.82 4.72 0 4.51
  [3,84,5.66,0,4.83,5.14,0,4.82,4.72,0,4.51],
// 4 84 5.16 0 3.22 4.72 0 4.51 4.57 0 4.02 4.73 0 3.52
  [4,84,5.16,0,3.22,4.72,0,4.51,4.57,0,4.02,4.73,0,3.52],
// 3 84 5.16 0 3.22 5.67 0 3.23 4.72 0 4.51
  [3,84,5.16,0,3.22,5.67,0,3.23,4.72,0,4.51],
// 3 84 5.67 0 3.23 6.09 0 3.54 6.25 0 4.04
  [3,84,5.67,0,3.23,6.09,0,3.54,6.25,0,4.04],
// 4 84 5.67 0 3.23 6.25 0 4.04 5.66 0 4.83 4.72 0 4.51
  [4,84,5.67,0,3.23,6.25,0,4.04,5.66,0,4.83,4.72,0,4.51],
// 4 226 -5.96 0 -.23 -5.81 0 -.57 -4.98 0 -1.33 -5.04 0 .15
  [4,226,-5.96,0,-.23,-5.81,0,-.57,-4.98,0,-1.33,-5.04,0,.15],
// 3 226 -10.33 0 -1.03 -10.21 0 -1.26 -8.58 0 -1.09
  [3,226,-10.33,0,-1.03,-10.21,0,-1.26,-8.58,0,-1.09],
// 4 226 -10.22 0 .92 -10.43 0 .36 -10.44 0 -.56 -8.56 0 .71
  [4,226,-10.22,0,.92,-10.43,0,.36,-10.44,0,-.56,-8.56,0,.71],
// 4 226 -5 0 .47 -4.79 0 .68 -8.85 0 2.78 -8.8 0 2.15
  [4,226,-5,0,.47,-4.79,0,.68,-8.85,0,2.78,-8.8,0,2.15],
// 4 226 -6.1 0 -.18 -8.8 0 2.15 -8.56 0 .71 -6.29 0 -.22
  [4,226,-6.1,0,-.18,-8.8,0,2.15,-8.56,0,.71,-6.29,0,-.22],
// 4 226 -8.58 0 -1.09 -6.47 0 -.41 -6.29 0 -.22 -8.56 0 .71
  [4,226,-8.58,0,-1.09,-6.47,0,-.41,-6.29,0,-.22,-8.56,0,.71],
// 4 226 -6.51 0 -.69 -8.58 0 -1.09 -7.8 0 -1.72 -7.61 0 -1.57
  [4,226,-6.51,0,-.69,-8.58,0,-1.09,-7.8,0,-1.72,-7.61,0,-1.57],
// 4 226 -10.33 0 -1.03 -8.58 0 -1.09 -8.56 0 .71 -10.44 0 -.56
  [4,226,-10.33,0,-1.03,-8.58,0,-1.09,-8.56,0,.71,-10.44,0,-.56],
// 4 226 -3.28 0 2.43 -8.77 0 4.05 -8.85 0 2.78 -4.79 0 .68
  [4,226,-3.28,0,2.43,-8.77,0,4.05,-8.85,0,2.78,-4.79,0,.68],
// 4 226 -7.85 0 6.28 -8.19 0 5.78 -8.46 0 5.24 -3.07 0 3.73
  [4,226,-7.85,0,6.28,-8.19,0,5.78,-8.46,0,5.24,-3.07,0,3.73],
// 4 226 -3.28 0 2.43 -3.07 0 3.73 -8.46 0 5.24 -8.77 0 4.05
  [4,226,-3.28,0,2.43,-3.07,0,3.73,-8.46,0,5.24,-8.77,0,4.05],
// 4 226 -6.93 0 7.1 -7.43 0 6.72 -7.85 0 6.28 -3.07 0 3.73
  [4,226,-6.93,0,7.1,-7.43,0,6.72,-7.85,0,6.28,-3.07,0,3.73],
// 4 226 -6.35 0 7.4 -2.76 0 5 -4.93 0 7.68 -5.69 0 7.6
  [4,226,-6.35,0,7.4,-2.76,0,5,-4.93,0,7.68,-5.69,0,7.6],
// 4 226 -3.48 0 7.43 -4.15 0 7.62 -4.93 0 7.68 -2.76 0 5
  [4,226,-3.48,0,7.43,-4.15,0,7.62,-4.93,0,7.68,-2.76,0,5],
// 4 226 -3.48 0 7.43 -2.76 0 5 -2.24 0 6.63 -2.71 0 7.06
  [4,226,-3.48,0,7.43,-2.76,0,5,-2.24,0,6.63,-2.71,0,7.06],
// 3 226 -8.58 0 -1.09 -6.51 0 -.69 -6.47 0 -.41
  [3,226,-8.58,0,-1.09,-6.51,0,-.69,-6.47,0,-.41],
// 3 226 -7.61 0 -1.57 -7.31 0 -1.64 -6.51 0 -.69
  [3,226,-7.61,0,-1.57,-7.31,0,-1.64,-6.51,0,-.69],
// 4 226 -5.96 0 -.23 -5 0 .47 -8.8 0 2.15 -6.1 0 -.18
  [4,226,-5.96,0,-.23,-5,0,.47,-8.8,0,2.15,-6.1,0,-.18],
// 4 226 -6.93 0 7.1 -3.07 0 3.73 -2.76 0 5 -6.35 0 7.4
  [4,226,-6.93,0,7.1,-3.07,0,3.73,-2.76,0,5,-6.35,0,7.4],
// 4 226 -6.22 0 -3.48 -6.43 0 -1.94 -7.18 0 -1.83 -7.05 0 -3.58
  [4,226,-6.22,0,-3.48,-6.43,0,-1.94,-7.18,0,-1.83,-7.05,0,-3.58],
// 4 226 -7.18 0 -1.83 -6.43 0 -1.94 -6.51 0 -.69 -7.31 0 -1.64
  [4,226,-7.18,0,-1.83,-6.43,0,-1.94,-6.51,0,-.69,-7.31,0,-1.64],
// 4 226 -4.79 0 .68 -4.49 0 .67 -3.41 0 1.1 -3.28 0 2.43
  [4,226,-4.79,0,.68,-4.49,0,.67,-3.41,0,1.1,-3.28,0,2.43],
// 4 226 -3.44 0 -.24 -3.41 0 1.1 -4.49 0 .67 -4.36 0 .42
  [4,226,-3.44,0,-.24,-3.41,0,1.1,-4.49,0,.67,-4.36,0,.42],
// 4 226 -6.61 0 -5.51 -5.94 0 -4.86 -6.22 0 -3.48 -7.05 0 -3.58
  [4,226,-6.61,0,-5.51,-5.94,0,-4.86,-6.22,0,-3.48,-7.05,0,-3.58],
// 4 226 -4.36 0 .42 -4.29 0 -1.2 -3.39 0 -1.57 -3.44 0 -.24
  [4,226,-4.36,0,.42,-4.29,0,-1.2,-3.39,0,-1.57,-3.44,0,-.24],
// 4 226 -4.29 0 -1.2 -4.13 0 -2.56 -3.24 0 -2.9 -3.39 0 -1.57
  [4,226,-4.29,0,-1.2,-4.13,0,-2.56,-3.24,0,-2.9,-3.39,0,-1.57],
// 4 226 -3.01 0 -4.2 -3.73 0 -4.6 -3.32 0 -6.16 -2.68 0 -5.47
  [4,226,-3.01,0,-4.2,-3.73,0,-4.6,-3.32,0,-6.16,-2.68,0,-5.47],
// 4 226 -3.01 0 -4.2 -3.24 0 -2.9 -4.13 0 -2.56 -3.73 0 -4.6
  [4,226,-3.01,0,-4.2,-3.24,0,-2.9,-4.13,0,-2.56,-3.73,0,-4.6],
// 3 226 -5.81 0 -.57 -5.71 0 -2.05 -4.98 0 -1.33
  [3,226,-5.81,0,-.57,-5.71,0,-2.05,-4.98,0,-1.33],
// 4 226 -5.55 0 -3.21 -4.79 0 -2.96 -4.98 0 -1.33 -5.71 0 -2.05
  [4,226,-5.55,0,-3.21,-4.79,0,-2.96,-4.98,0,-1.33,-5.71,0,-2.05],
// 4 226 -4.79 0 -2.96 -5.55 0 -3.21 -5.24 0 -4.74 -4.48 0 -4.54
  [4,226,-4.79,0,-2.96,-5.55,0,-3.21,-5.24,0,-4.74,-4.48,0,-4.54],
// 4 226 -4.01 0 -6.3 -4.48 0 -4.54 -5.24 0 -4.74 -4.87 0 -6.11
  [4,226,-4.01,0,-6.3,-4.48,0,-4.54,-5.24,0,-4.74,-4.87,0,-6.11],
// 3 226 -5.96 0 -.23 -5.04 0 .15 -5 0 .47
  [3,226,-5.96,0,-.23,-5.04,0,.15,-5,0,.47],
// 4 226 -4.87 0 -6.11 -4.92 0 -6.54 -3.88 0 -6.56 -4.01 0 -6.3
  [4,226,-4.87,0,-6.11,-4.92,0,-6.54,-3.88,0,-6.56,-4.01,0,-6.3],
// 4 226 -5.13 0 -6.66 -4.4 0 -7.86 -3.88 0 -6.56 -4.92 0 -6.54
  [4,226,-5.13,0,-6.66,-4.4,0,-7.86,-3.88,0,-6.56,-4.92,0,-6.54],
// 3 226 -3.9 0 -7.76 -3.88 0 -6.56 -4.4 0 -7.86
  [3,226,-3.9,0,-7.76,-3.88,0,-6.56,-4.4,0,-7.86],
// 4 226 -2.68 0 -5.47 -3.32 0 -6.16 -3.37 0 -6.53 -2.27 0 -6.91
  [4,226,-2.68,0,-5.47,-3.32,0,-6.16,-3.37,0,-6.53,-2.27,0,-6.91],
// 4 226 -3.88 0 -6.56 -3.9 0 -7.76 -3.13 0 -7.48 -3.64 0 -6.67
  [4,226,-3.88,0,-6.56,-3.9,0,-7.76,-3.13,0,-7.48,-3.64,0,-6.67],
// 4 226 -3.64 0 -6.67 -3.13 0 -7.48 -2.27 0 -6.91 -3.37 0 -6.53
  [4,226,-3.64,0,-6.67,-3.13,0,-7.48,-2.27,0,-6.91,-3.37,0,-6.53],
// 3 226 -5.38 0 -7.86 -4.4 0 -7.86 -5.13 0 -6.66
  [3,226,-5.38,0,-7.86,-4.4,0,-7.86,-5.13,0,-6.66],
// 4 226 -5.85 0 -7.77 -5.38 0 -7.86 -5.13 0 -6.66 -5.37 0 -6.61
  [4,226,-5.85,0,-7.77,-5.38,0,-7.86,-5.13,0,-6.66,-5.37,0,-6.61],
// 4 226 -7.21 0 -5.84 -7.87 0 -6.46 -7.52 0 -6.85 -7.11 0 -5.92
  [4,226,-7.21,0,-5.84,-7.87,0,-6.46,-7.52,0,-6.85,-7.11,0,-5.92],
// 4 226 -6.74 0 -7.41 -6.9 0 -5.97 -7.11 0 -5.92 -7.52 0 -6.85
  [4,226,-6.74,0,-7.41,-6.9,0,-5.97,-7.11,0,-5.92,-7.52,0,-6.85],
// 3 226 -8.2 0 -5.98 -7.87 0 -6.46 -7.21 0 -5.84
  [3,226,-8.2,0,-5.98,-7.87,0,-6.46,-7.21,0,-5.84],
// 4 226 -7.8 0 -1.72 -8.58 0 -1.09 -8.85 0 -2.83 -7.87 0 -2.04
  [4,226,-7.8,0,-1.72,-8.58,0,-1.09,-8.85,0,-2.83,-7.87,0,-2.04],
// 4 226 -8.68 0 -4.79 -7.78 0 -3.49 -8.85 0 -2.83 -8.83 0 -3.98
  [4,226,-8.68,0,-4.79,-7.78,0,-3.49,-8.85,0,-2.83,-8.83,0,-3.98],
// 3 226 -7.78 0 -3.49 -7.87 0 -2.04 -8.85 0 -2.83
  [3,226,-7.78,0,-3.49,-7.87,0,-2.04,-8.85,0,-2.83],
// 4 226 -8.47 0 -5.42 -7.48 0 -5.1 -7.78 0 -3.49 -8.68 0 -4.79
  [4,226,-8.47,0,-5.42,-7.48,0,-5.1,-7.78,0,-3.49,-8.68,0,-4.79],
// 4 226 -8.47 0 -5.42 -8.2 0 -5.98 -7.21 0 -5.84 -7.48 0 -5.1
  [4,226,-8.47,0,-5.42,-8.2,0,-5.98,-7.21,0,-5.84,-7.48,0,-5.1],
// 4 226 -5.85 0 -7.77 -5.37 0 -6.61 -5.55 0 -6.3 -6.74 0 -7.41
  [4,226,-5.85,0,-7.77,-5.37,0,-6.61,-5.55,0,-6.3,-6.74,0,-7.41],
// 4 226 -6.65 0 -5.77 -6.9 0 -5.97 -6.74 0 -7.41 -5.55 0 -6.3
  [4,226,-6.65,0,-5.77,-6.9,0,-5.97,-6.74,0,-7.41,-5.55,0,-6.3],
// 4 226 -5.94 0 -4.86 -6.61 0 -5.51 -6.65 0 -5.77 -5.55 0 -6.3
  [4,226,-5.94,0,-4.86,-6.61,0,-5.51,-6.65,0,-5.77,-5.55,0,-6.3],
// 4 308 1.28 0 4.34 4.73 0 3.52 4.57 0 4.02 1.98 0 4.45
  [4,308,1.28,0,4.34,4.73,0,3.52,4.57,0,4.02,1.98,0,4.45],
// 3 308 10.11 0 -.34 10.65 0 0 10.03 0 .41
  [3,308,10.11,0,-.34,10.65,0,0,10.03,0,.41],
// 4 308 10.11 0 -.34 10.03 0 .41 9.65 0 .87 9.67 0 -.83
  [4,308,10.11,0,-.34,10.03,0,.41,9.65,0,.87,9.67,0,-.83],
// 4 308 7.3 0 -5.33 8 0 -4.47 8.84 0 -2.98 5.16 0 3.22
  [4,308,7.3,0,-5.33,8,0,-4.47,8.84,0,-2.98,5.16,0,3.22],
// 4 308 9.67 0 -.83 5.67 0 3.23 5.16 0 3.22 8.84 0 -2.98
  [4,308,9.67,0,-.83,5.67,0,3.23,5.16,0,3.22,8.84,0,-2.98],
// 4 308 8.29 0 4 6.09 0 3.54 5.67 0 3.23 8.82 0 3.02
  [4,308,8.29,0,4,6.09,0,3.54,5.67,0,3.23,8.82,0,3.02],
// 4 308 7.68 0 4.93 6.25 0 4.04 6.09 0 3.54 8.29 0 4
  [4,308,7.68,0,4.93,6.25,0,4.04,6.09,0,3.54,8.29,0,4],
// 4 308 8.82 0 3.02 5.67 0 3.23 9.67 0 -.83 9.65 0 .87
  [4,308,8.82,0,3.02,5.67,0,3.23,9.67,0,-.83,9.65,0,.87],
// 4 308 6.91 0 -5.69 7.3 0 -5.33 5.52 0 -6.49 6.27 0 -6.13
  [4,308,6.91,0,-5.69,7.3,0,-5.33,5.52,0,-6.49,6.27,0,-6.13],
// 4 308 4.07 0 -6.89 -2.12 0 -2.68 2.02 0 -6.99 3.06 0 -6.99
  [4,308,4.07,0,-6.89,-2.12,0,-2.68,2.02,0,-6.99,3.06,0,-6.99],
// 4 308 -1.42 0 -5.86 -.03 0 -6.72 .99 0 -6.89 -1.93 0 -3.96
  [4,308,-1.42,0,-5.86,-.03,0,-6.72,.99,0,-6.89,-1.93,0,-3.96],
// 4 308 .99 0 -6.89 2.02 0 -6.99 -2.12 0 -2.68 -1.93 0 -3.96
  [4,308,.99,0,-6.89,2.02,0,-6.99,-2.12,0,-2.68,-1.93,0,-3.96],
// 3 308 -1.42 0 -5.86 -1.17 0 -6.38 -.03 0 -6.72
  [3,308,-1.42,0,-5.86,-1.17,0,-6.38,-.03,0,-6.72],
// 4 308 4.73 0 3.52 .52 0 4.09 -2.21 0 1.41 -2.23 0 -.67
  [4,308,4.73,0,3.52,.52,0,4.09,-2.21,0,1.41,-2.23,0,-.67],
// 4 308 4.73 0 3.52 -2.23 0 -.67 -2.12 0 -2.68 5.16 0 3.22
  [4,308,4.73,0,3.52,-2.23,0,-.67,-2.12,0,-2.68,5.16,0,3.22],
// 4 308 -2.03 0 3.43 -2.21 0 1.41 .52 0 4.09 .11 0 4.15
  [4,308,-2.03,0,3.43,-2.21,0,1.41,.52,0,4.09,.11,0,4.15],
// 4 308 .11 0 4.15 -.14 0 4.48 -1.77 0 4.72 -2.03 0 3.43
  [4,308,.11,0,4.15,-.14,0,4.48,-1.77,0,4.72,-2.03,0,3.43],
// 4 308 4.68 0 -6.76 5.52 0 -6.49 7.3 0 -5.33 5.16 0 3.22
  [4,308,4.68,0,-6.76,5.52,0,-6.49,7.3,0,-5.33,5.16,0,3.22],
// 3 308 1.28 0 4.34 .52 0 4.09 4.73 0 3.52
  [3,308,1.28,0,4.34,.52,0,4.09,4.73,0,3.52],
// 4 308 4.68 0 -6.76 5.16 0 3.22 -2.12 0 -2.68 4.07 0 -6.89
  [4,308,4.68,0,-6.76,5.16,0,3.22,-2.12,0,-2.68,4.07,0,-6.89],
// 4 308 -.16 0 4.88 .11 0 5.21 -1.05 0 6.47 -1.26 0 6.3
  [4,308,-.16,0,4.88,.11,0,5.21,-1.05,0,6.47,-1.26,0,6.3],
// 4 308 -.14 0 4.48 -.16 0 4.88 -1.26 0 6.3 -1.77 0 4.72
  [4,308,-.14,0,4.48,-.16,0,4.88,-1.26,0,6.3,-1.77,0,4.72],
// 4 308 .61 0 5.44 .59 0 6.86 -1.05 0 6.47 .11 0 5.21
  [4,308,.61,0,5.44,.59,0,6.86,-1.05,0,6.47,.11,0,5.21],
// 4 308 3.38 0 5.57 3.28 0 6.98 2.37 0 7.01 2.78 0 5.7
  [4,308,3.38,0,5.57,3.28,0,6.98,2.37,0,7.01,2.78,0,5.7],
// 4 308 3.85 0 4.97 5.02 0 6.67 4.17 0 6.87 3.7 0 5.34
  [4,308,3.85,0,4.97,5.02,0,6.67,4.17,0,6.87,3.7,0,5.34],
// 4 308 3.28 0 6.98 3.38 0 5.57 3.7 0 5.34 4.17 0 6.87
  [4,308,3.28,0,6.98,3.38,0,5.57,3.7,0,5.34,4.17,0,6.87],
// 4 308 5.02 0 6.67 3.85 0 4.97 6.56 0 5.97 5.82 0 6.37
  [4,308,5.02,0,6.67,3.85,0,4.97,6.56,0,5.97,5.82,0,6.37],
// 3 308 3.85 0 4.97 7.01 0 5.64 6.56 0 5.97
  [3,308,3.85,0,4.97,7.01,0,5.64,6.56,0,5.97],
// 3 308 2.37 0 7.01 1.65 0 5.67 2.78 0 5.7
  [3,308,2.37,0,7.01,1.65,0,5.67,2.78,0,5.7],
// 4 308 2.37 0 7.01 .59 0 6.86 .61 0 5.44 1.65 0 5.67
  [4,308,2.37,0,7.01,.59,0,6.86,.61,0,5.44,1.65,0,5.67],
// 3 308 3.4 0 4.36 1.98 0 4.45 4.57 0 4.02
  [3,308,3.4,0,4.36,1.98,0,4.45,4.57,0,4.02],
// 4 308 4.72 0 4.51 3.72 0 4.59 3.4 0 4.36 4.57 0 4.02
  [4,308,4.72,0,4.51,3.72,0,4.59,3.4,0,4.36,4.57,0,4.02],
// 4 308 5.66 0 4.83 7.01 0 5.64 3.85 0 4.97 5.14 0 4.82
  [4,308,5.66,0,4.83,7.01,0,5.64,3.85,0,4.97,5.14,0,4.82],
// 4 308 3.72 0 4.59 4.72 0 4.51 5.14 0 4.82 3.85 0 4.97
  [4,308,3.72,0,4.59,4.72,0,4.51,5.14,0,4.82,3.85,0,4.97],
// 4 308 7.01 0 5.64 6.08 0 4.53 6.25 0 4.04 7.68 0 4.93
  [4,308,7.01,0,5.64,6.08,0,4.53,6.25,0,4.04,7.68,0,4.93],
// 3 308 5.66 0 4.83 6.08 0 4.53 7.01 0 5.64
  [3,308,5.66,0,4.83,6.08,0,4.53,7.01,0,5.64],
];
module ldraw_lib__3069bp0v(step=0, col=false, unit=2/5, alt=false, line=0.2, solid=!$preview)
    makepoly(ldraw_lib__3069bp0v(), step=step, col=col, unit=unit, alt=alt, line=line, solid=solid);
ldraw_lib__3069bp0v(line=0.2);
